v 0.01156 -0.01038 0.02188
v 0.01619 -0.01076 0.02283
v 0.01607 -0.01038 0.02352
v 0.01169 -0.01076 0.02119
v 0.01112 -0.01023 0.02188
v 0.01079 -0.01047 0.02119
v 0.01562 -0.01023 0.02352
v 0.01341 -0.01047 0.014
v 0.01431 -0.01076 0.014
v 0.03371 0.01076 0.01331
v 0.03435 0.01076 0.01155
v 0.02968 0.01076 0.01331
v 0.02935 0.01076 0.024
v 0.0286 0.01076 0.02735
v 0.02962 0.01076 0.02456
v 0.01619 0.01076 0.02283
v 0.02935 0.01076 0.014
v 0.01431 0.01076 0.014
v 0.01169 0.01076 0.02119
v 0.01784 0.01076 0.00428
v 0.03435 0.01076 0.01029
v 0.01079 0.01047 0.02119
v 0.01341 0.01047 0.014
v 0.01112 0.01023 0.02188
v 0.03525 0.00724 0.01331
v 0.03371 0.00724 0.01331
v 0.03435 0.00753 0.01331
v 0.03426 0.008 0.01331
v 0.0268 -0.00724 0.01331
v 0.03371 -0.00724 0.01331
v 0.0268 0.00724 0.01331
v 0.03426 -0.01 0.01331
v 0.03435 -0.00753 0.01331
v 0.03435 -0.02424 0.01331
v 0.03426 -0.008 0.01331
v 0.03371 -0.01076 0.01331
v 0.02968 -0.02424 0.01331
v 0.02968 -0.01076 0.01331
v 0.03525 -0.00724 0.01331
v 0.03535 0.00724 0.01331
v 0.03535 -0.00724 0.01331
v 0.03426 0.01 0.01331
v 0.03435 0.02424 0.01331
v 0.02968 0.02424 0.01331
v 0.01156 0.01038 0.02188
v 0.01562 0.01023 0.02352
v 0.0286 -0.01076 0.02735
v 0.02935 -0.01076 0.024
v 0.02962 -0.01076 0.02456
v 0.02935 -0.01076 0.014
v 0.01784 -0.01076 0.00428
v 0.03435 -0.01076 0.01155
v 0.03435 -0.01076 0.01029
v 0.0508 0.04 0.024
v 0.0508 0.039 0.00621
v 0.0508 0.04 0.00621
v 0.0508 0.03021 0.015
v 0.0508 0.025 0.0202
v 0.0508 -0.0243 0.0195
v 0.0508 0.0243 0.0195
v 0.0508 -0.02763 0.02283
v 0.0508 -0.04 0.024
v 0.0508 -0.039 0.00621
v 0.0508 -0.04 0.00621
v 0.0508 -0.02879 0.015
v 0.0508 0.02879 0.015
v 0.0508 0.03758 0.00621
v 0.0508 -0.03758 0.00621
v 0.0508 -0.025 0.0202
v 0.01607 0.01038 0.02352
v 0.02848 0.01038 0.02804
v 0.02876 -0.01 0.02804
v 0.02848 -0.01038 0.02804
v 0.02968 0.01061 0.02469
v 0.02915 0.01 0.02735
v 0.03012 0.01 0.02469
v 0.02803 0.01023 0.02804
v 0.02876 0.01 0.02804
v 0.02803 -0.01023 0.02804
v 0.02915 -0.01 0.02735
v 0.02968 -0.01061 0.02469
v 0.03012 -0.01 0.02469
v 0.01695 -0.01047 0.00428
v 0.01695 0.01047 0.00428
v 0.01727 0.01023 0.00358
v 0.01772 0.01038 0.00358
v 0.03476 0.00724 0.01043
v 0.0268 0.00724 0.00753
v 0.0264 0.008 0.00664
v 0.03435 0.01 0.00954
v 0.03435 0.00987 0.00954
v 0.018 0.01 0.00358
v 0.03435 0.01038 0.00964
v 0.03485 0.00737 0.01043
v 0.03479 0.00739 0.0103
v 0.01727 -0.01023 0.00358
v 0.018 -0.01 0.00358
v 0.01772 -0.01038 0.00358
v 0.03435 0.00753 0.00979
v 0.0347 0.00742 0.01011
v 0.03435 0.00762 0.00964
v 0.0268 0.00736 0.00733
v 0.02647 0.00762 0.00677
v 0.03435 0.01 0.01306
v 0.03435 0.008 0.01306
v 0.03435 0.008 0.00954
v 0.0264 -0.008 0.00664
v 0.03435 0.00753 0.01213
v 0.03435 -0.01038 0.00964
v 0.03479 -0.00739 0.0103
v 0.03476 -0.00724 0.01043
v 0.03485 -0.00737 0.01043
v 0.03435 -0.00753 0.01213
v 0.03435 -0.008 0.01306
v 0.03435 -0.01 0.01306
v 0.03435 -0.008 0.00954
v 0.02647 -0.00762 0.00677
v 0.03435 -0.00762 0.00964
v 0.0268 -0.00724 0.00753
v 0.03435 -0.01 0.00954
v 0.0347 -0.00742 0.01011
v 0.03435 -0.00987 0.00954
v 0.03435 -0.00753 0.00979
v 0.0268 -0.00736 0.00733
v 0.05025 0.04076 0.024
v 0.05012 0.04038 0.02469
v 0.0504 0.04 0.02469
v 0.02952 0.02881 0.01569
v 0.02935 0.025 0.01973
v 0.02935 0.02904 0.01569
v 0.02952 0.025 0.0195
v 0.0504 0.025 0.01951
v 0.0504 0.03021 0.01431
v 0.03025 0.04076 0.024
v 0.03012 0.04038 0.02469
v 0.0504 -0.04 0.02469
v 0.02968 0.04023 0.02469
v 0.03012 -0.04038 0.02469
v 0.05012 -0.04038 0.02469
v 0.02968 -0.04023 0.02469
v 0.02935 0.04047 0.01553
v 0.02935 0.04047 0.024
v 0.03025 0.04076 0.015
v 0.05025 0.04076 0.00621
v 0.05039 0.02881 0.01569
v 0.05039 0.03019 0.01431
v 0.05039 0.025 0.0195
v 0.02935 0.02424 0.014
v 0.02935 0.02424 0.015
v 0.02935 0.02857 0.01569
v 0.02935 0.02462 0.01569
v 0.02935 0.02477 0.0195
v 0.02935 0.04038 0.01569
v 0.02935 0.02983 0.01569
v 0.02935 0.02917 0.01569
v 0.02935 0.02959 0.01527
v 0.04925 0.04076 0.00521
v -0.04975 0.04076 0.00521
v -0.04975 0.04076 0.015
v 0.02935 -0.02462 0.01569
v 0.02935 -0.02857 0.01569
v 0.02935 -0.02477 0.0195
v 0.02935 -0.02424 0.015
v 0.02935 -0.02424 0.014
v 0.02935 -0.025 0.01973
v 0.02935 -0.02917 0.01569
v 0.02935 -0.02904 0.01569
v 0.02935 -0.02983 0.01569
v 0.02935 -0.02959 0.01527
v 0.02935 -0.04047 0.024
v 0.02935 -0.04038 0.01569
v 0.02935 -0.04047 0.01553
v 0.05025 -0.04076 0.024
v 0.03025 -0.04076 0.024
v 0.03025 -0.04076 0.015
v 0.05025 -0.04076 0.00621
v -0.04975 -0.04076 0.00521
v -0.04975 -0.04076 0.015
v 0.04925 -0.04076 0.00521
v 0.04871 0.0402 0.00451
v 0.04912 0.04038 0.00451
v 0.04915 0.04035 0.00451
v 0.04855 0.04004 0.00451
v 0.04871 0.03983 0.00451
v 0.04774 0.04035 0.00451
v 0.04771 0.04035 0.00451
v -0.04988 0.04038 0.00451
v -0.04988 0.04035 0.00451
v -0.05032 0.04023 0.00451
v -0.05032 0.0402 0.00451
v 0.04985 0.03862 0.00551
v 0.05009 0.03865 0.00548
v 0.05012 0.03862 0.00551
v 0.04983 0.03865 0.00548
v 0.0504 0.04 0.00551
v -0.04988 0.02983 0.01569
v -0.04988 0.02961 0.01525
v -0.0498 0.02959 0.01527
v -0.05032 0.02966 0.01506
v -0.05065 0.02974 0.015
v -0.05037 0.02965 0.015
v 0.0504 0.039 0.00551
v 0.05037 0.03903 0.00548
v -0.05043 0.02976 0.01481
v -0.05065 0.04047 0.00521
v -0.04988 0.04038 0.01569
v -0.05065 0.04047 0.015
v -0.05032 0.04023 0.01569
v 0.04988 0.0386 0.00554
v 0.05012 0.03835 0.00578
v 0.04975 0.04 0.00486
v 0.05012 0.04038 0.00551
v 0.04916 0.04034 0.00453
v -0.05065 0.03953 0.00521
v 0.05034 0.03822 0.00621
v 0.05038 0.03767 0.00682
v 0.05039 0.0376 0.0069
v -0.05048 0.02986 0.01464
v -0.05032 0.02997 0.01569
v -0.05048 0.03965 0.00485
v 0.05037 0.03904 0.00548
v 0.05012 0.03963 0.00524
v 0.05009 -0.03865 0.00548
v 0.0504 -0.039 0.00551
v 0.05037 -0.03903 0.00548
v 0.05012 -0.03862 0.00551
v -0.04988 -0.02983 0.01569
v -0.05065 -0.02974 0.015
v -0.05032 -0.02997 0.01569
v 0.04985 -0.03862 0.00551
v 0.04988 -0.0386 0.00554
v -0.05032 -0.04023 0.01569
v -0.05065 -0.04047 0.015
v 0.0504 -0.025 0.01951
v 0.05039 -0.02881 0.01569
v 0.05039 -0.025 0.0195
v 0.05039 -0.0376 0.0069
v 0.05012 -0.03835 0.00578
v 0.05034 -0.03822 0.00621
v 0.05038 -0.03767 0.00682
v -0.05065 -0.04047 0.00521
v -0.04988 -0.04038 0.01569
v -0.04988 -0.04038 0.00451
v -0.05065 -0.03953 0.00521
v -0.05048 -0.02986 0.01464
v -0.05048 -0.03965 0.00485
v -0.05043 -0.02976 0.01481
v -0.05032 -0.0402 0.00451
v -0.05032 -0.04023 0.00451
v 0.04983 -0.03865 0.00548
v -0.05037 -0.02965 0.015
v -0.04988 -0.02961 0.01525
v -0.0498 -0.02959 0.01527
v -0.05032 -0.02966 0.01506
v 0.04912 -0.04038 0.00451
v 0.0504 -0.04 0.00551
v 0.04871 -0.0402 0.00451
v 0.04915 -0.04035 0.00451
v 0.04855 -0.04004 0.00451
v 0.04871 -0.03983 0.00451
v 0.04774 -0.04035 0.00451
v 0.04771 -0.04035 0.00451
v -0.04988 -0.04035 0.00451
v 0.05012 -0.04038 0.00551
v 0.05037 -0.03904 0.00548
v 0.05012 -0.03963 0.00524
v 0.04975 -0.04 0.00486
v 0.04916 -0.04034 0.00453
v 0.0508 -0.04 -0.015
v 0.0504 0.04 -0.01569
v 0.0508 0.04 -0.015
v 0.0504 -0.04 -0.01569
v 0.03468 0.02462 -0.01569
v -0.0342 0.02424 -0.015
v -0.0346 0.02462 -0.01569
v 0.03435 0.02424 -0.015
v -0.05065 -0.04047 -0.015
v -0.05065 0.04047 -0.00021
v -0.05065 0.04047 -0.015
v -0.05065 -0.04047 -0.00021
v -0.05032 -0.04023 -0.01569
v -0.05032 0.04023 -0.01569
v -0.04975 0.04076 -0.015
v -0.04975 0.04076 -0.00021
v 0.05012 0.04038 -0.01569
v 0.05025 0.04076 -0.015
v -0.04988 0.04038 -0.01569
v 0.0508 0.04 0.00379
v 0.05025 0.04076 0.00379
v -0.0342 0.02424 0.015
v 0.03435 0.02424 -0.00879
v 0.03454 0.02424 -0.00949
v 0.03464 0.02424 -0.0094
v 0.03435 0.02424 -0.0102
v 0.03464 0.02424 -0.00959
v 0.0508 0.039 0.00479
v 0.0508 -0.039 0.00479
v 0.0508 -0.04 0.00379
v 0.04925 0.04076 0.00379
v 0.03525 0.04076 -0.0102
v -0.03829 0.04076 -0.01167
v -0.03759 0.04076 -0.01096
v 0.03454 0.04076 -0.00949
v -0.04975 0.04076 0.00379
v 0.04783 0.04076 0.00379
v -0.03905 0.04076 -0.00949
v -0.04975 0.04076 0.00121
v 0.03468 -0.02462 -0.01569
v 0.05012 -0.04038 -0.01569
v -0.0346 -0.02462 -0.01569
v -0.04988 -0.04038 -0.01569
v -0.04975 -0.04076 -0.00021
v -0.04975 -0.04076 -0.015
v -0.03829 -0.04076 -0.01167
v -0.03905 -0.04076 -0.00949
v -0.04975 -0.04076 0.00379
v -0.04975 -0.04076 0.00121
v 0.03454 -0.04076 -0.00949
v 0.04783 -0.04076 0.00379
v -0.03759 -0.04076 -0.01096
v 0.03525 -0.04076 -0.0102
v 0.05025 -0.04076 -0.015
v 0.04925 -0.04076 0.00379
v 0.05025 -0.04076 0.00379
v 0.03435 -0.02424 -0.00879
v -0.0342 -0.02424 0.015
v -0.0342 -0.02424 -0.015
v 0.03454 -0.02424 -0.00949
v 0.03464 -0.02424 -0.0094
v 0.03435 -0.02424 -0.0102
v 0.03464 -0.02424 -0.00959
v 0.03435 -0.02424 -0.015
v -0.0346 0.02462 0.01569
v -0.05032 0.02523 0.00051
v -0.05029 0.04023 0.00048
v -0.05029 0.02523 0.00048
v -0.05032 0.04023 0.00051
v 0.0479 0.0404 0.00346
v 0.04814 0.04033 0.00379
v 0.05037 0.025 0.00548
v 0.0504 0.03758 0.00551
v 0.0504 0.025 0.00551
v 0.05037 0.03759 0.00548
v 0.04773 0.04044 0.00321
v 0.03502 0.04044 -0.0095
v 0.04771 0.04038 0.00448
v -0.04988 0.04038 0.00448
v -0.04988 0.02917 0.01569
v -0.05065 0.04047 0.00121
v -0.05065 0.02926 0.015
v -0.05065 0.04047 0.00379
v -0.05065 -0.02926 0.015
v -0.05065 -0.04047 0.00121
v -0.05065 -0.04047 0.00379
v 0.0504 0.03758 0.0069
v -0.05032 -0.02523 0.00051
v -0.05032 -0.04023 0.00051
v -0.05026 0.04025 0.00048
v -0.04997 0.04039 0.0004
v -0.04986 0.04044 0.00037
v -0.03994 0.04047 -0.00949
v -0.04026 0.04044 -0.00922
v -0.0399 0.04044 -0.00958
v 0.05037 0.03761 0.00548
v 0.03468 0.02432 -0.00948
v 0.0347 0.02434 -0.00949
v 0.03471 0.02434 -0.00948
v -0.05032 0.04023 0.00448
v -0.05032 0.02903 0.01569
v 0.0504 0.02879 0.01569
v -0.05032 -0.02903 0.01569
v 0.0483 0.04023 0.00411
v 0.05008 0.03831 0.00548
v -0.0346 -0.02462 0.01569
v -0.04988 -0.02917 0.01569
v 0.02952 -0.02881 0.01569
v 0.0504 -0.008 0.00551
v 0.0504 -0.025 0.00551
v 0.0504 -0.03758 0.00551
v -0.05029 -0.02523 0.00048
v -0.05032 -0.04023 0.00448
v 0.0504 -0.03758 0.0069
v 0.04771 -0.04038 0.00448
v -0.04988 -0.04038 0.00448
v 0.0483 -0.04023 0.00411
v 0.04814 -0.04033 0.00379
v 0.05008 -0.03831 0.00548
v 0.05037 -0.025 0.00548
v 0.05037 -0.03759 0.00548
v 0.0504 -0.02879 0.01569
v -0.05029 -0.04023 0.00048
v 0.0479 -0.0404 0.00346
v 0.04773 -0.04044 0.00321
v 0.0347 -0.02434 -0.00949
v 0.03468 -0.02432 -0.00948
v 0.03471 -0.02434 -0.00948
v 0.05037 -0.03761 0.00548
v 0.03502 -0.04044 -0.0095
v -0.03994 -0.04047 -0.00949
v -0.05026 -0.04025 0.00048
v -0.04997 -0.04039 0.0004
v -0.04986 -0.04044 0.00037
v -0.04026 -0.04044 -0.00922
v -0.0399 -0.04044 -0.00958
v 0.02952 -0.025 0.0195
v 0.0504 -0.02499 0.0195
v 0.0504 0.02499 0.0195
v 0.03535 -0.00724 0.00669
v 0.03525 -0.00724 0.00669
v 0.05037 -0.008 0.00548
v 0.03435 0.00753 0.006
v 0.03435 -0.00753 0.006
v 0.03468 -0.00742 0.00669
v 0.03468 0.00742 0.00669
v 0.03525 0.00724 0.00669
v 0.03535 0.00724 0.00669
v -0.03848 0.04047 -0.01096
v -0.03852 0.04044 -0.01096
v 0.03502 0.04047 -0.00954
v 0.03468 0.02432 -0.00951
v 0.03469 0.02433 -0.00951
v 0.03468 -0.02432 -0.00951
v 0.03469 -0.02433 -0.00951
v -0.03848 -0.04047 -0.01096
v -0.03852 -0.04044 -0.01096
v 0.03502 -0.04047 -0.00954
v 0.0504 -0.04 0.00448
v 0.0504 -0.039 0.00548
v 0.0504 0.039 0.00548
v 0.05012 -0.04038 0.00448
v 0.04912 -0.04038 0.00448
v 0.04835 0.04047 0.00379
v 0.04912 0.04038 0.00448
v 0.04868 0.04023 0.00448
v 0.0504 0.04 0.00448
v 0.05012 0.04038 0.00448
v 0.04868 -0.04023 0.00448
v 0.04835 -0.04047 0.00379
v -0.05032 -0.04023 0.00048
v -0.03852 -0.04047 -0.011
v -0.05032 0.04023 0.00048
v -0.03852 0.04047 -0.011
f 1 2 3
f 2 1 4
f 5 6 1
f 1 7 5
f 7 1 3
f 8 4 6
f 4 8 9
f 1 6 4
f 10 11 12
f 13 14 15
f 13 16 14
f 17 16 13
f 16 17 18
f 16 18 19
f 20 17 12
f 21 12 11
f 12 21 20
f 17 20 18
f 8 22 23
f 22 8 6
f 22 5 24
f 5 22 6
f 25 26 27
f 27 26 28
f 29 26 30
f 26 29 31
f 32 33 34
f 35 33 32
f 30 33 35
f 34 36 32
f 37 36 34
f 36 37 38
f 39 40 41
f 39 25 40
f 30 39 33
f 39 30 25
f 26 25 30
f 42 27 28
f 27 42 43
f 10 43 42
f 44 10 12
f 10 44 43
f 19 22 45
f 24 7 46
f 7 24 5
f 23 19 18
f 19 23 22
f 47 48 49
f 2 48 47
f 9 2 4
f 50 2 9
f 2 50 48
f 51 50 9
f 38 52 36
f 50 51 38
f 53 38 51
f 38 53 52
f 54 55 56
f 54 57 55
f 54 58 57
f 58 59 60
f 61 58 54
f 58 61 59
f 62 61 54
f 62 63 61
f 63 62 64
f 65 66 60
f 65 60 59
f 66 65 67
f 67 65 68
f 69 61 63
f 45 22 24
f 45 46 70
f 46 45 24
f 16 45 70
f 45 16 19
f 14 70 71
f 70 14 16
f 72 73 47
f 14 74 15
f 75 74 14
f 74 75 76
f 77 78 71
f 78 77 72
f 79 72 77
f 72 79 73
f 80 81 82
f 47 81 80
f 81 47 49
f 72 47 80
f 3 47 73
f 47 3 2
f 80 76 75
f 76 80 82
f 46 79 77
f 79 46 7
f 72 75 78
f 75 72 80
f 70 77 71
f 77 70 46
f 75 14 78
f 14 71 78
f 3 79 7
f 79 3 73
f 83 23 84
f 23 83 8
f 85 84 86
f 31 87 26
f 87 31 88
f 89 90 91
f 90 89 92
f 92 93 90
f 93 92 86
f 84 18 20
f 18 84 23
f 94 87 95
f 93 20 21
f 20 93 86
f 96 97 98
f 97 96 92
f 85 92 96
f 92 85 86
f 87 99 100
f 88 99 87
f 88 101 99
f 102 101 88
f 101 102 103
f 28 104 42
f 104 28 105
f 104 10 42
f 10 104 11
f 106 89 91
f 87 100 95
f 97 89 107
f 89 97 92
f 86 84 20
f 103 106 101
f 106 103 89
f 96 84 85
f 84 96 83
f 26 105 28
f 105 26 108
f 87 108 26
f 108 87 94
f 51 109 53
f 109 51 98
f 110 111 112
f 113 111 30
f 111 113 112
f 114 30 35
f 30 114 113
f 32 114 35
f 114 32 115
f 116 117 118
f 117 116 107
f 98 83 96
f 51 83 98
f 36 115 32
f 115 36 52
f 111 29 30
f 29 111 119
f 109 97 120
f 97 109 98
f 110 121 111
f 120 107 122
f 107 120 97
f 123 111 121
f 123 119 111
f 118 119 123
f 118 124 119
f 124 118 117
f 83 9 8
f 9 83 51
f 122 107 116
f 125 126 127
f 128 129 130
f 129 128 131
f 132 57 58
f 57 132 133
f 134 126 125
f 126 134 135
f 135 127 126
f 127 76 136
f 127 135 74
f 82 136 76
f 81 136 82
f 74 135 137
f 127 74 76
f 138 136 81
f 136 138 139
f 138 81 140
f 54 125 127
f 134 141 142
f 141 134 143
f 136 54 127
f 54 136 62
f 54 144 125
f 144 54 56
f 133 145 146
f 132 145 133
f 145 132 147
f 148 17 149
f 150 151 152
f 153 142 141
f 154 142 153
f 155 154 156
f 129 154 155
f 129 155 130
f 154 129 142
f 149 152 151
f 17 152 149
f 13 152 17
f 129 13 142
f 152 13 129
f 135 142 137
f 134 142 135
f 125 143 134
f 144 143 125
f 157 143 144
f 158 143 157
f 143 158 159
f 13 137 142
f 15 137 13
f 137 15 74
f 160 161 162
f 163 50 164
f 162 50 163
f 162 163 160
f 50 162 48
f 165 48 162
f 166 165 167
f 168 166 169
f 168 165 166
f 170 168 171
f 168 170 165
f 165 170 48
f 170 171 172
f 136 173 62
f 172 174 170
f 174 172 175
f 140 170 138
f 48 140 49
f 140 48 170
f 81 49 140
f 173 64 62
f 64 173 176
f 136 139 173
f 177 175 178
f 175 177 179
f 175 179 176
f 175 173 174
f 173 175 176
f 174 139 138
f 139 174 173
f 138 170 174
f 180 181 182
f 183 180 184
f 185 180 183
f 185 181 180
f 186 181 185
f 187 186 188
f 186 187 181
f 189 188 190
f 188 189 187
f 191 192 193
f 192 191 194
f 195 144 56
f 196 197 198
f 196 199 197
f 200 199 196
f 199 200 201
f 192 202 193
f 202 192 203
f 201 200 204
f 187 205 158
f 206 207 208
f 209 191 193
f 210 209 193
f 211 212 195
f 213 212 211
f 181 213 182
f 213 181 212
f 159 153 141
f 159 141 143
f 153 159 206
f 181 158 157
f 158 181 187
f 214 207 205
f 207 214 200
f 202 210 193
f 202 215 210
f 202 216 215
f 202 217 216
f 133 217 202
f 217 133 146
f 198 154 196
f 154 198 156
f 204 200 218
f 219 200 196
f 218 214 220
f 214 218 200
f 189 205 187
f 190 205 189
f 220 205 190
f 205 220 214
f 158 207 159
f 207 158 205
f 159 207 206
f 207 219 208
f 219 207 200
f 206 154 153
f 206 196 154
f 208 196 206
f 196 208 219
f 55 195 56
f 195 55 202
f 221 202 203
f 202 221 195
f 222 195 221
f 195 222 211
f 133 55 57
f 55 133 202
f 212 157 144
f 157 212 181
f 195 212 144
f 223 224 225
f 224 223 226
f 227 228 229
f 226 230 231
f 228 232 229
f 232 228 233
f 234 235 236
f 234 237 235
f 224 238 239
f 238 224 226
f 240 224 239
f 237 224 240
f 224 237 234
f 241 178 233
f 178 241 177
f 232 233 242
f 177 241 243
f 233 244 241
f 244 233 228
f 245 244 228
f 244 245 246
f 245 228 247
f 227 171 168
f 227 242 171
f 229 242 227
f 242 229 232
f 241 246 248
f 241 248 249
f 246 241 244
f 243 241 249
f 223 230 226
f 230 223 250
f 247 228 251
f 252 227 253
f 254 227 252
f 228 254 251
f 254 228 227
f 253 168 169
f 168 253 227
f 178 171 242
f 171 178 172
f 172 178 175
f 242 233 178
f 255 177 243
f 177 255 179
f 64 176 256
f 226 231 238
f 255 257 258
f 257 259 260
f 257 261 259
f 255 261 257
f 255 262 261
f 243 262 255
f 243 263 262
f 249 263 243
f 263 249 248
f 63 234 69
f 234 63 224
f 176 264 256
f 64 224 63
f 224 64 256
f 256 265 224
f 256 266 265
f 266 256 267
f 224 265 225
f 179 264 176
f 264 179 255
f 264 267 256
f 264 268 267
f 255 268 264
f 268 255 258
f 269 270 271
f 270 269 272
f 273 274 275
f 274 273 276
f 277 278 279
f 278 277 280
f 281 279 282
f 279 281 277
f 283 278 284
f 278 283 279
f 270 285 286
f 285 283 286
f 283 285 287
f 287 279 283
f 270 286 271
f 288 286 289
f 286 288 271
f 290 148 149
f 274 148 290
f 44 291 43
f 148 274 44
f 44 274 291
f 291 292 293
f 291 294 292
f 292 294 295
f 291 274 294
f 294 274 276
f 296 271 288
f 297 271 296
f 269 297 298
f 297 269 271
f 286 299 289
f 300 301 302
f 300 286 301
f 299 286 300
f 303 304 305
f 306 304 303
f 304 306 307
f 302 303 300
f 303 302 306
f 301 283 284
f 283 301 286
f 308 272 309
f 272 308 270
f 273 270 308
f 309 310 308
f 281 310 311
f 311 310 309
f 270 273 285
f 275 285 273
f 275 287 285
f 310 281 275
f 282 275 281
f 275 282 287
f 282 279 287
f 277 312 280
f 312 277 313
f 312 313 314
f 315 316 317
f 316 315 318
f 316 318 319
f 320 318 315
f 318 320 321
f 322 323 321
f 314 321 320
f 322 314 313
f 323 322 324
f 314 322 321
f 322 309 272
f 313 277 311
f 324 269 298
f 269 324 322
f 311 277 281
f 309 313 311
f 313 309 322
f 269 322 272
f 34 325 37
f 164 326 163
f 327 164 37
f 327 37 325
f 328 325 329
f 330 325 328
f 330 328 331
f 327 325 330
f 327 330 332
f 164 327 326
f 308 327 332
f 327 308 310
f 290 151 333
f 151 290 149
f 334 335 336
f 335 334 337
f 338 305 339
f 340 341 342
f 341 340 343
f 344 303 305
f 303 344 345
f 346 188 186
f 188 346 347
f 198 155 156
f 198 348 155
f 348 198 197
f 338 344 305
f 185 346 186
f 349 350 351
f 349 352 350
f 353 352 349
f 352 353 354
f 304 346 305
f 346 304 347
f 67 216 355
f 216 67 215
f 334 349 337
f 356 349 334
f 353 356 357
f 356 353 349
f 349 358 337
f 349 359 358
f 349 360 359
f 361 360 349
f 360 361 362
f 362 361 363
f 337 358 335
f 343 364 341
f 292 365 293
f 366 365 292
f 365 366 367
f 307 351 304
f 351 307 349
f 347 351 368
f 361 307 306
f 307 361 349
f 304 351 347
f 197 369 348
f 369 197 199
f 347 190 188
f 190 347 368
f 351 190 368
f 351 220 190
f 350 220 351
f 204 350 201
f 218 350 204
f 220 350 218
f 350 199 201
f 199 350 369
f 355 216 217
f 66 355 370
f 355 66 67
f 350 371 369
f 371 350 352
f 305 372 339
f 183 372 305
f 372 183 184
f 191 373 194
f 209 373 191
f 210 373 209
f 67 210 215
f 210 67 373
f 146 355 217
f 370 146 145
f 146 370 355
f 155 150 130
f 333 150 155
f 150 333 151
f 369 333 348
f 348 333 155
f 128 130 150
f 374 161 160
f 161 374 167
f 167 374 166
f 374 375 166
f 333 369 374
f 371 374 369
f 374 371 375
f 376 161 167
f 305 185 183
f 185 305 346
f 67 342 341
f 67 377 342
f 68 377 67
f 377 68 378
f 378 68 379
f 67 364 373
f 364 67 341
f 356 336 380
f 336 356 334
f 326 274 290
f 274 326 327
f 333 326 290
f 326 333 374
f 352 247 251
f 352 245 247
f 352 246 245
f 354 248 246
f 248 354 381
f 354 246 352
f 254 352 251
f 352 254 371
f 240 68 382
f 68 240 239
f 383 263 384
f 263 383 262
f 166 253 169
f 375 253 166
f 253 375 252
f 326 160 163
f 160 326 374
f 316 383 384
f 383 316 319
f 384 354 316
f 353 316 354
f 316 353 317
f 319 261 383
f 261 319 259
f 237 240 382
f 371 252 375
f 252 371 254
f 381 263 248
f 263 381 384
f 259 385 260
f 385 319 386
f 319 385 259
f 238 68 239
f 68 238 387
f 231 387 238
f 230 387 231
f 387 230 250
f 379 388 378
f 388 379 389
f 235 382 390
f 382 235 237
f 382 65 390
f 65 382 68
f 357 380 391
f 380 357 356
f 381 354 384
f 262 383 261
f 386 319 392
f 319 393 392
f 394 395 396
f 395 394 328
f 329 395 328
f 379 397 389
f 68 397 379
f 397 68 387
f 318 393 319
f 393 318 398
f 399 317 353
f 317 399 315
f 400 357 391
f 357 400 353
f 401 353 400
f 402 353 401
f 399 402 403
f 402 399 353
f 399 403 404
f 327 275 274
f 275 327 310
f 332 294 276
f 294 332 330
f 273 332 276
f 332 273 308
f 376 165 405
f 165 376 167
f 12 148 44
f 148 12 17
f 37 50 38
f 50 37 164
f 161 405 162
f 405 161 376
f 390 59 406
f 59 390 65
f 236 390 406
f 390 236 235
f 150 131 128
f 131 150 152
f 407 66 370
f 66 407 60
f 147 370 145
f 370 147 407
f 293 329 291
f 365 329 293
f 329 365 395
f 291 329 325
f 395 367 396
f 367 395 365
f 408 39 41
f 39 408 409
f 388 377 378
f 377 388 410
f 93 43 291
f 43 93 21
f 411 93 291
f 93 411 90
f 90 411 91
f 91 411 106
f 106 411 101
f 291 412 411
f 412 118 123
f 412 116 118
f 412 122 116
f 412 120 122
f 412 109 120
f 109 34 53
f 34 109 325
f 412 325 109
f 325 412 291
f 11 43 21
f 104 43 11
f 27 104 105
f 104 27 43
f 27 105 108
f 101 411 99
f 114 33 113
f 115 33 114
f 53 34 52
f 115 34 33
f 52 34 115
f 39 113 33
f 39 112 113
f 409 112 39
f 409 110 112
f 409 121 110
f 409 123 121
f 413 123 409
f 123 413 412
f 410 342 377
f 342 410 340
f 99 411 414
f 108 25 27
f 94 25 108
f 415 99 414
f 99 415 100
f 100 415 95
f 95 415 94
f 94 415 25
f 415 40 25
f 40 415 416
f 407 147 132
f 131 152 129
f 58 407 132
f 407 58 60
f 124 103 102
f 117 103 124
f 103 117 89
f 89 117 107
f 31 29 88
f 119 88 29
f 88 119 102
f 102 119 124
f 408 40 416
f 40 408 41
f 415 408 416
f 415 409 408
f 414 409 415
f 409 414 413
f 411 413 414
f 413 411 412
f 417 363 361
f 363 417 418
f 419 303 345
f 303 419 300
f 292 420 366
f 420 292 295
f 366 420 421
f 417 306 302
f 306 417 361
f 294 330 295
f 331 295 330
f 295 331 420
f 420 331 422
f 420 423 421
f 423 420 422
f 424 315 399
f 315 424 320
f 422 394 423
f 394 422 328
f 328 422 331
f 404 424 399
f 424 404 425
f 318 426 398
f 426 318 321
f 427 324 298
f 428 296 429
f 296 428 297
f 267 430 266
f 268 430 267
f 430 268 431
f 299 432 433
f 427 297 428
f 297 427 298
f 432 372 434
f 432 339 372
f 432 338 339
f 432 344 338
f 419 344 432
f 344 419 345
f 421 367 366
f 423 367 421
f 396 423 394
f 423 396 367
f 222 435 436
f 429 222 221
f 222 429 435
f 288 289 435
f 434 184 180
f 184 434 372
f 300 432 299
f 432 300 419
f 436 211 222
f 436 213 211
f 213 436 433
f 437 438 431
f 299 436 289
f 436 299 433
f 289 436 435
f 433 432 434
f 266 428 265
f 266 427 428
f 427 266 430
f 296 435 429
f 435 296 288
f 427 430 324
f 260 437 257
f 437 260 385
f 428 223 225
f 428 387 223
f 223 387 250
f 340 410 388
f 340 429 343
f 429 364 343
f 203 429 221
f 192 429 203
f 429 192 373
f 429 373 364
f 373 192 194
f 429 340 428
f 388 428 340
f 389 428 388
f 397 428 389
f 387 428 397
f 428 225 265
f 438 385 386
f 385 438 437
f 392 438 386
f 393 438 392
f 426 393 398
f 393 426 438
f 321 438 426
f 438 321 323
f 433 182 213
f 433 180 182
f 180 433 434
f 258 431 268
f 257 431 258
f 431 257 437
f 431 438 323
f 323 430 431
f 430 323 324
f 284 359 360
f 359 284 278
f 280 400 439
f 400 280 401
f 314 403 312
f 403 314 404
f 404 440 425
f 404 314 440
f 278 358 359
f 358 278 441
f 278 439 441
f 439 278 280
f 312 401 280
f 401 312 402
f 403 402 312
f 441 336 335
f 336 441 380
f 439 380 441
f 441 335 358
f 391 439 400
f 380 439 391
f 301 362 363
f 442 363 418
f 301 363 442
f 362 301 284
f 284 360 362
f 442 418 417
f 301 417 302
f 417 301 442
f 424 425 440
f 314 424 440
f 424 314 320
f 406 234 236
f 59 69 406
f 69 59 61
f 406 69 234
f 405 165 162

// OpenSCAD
// Parameters
L = 0.1; //[0.05:0.2:0.001]
W = 0.08; //[0.04:0.16:0.001]
T = 0.03; //[0.015:0.06:0.001]
frame_wall = 0.012; //[0.006:0.024:0.001]
opening_L = 0.07; //[0.035:0.09:0.001]
opening_W = 0.05; //[0.025:0.07:0.001]
end_block_L = 0.02; //[0.01:0.04:0.001]
end_block_extra_T = 0.01; //[0.005:0.02:0.001]
tab_L = 0.018; //[0.009:0.036:0.001]
tab_W = 0.02; //[0.01:0.04:0.001]
tab_T = 0.018; //[0.009:0.03:0.001]
tab_angle_deg = 20; //[0:45:1]
step_drop = 0.006; //[0.003:0.012:0.001]
gap_H = 0.008; //[0.004:0.016:0.001]
gap_L = 0.01; //[0.005:0.02:0.001]
overlap = 0.001; //[0.0005:0.002:0.0005]
chamfer = 0.001; //[0.0005:0.003:0.0005]
fillet_r = 0.0008; //[0.0004:0.002:0.0002]

// Base Shapes
module outer_frame_plate() {
  cube([L, W, T], center=true);
}

module central_through_opening() {
  cube([opening_L, opening_W, T + 2*overlap], center=true);
}

module end_block_thick_region() {
  translate([L/2 - end_block_L/2, 0, T/2 + end_block_extra_T/2 - overlap])
    cube([end_block_L, W, end_block_extra_T], center=true);
}

module cantilever_hook_tab_raw() {
  translate([opening_L/2 - tab_L/2 + overlap, 0, T/2 - tab_T/2 + overlap])
    cube([tab_L, tab_W, tab_T], center=true);
}

module hook_step_raw() {
  translate([opening_L/2 - (tab_L*0.35)/2 + overlap, 0, T/2 - tab_T/2 - step_drop/2 + overlap])
    cube([tab_L*0.35, tab_W, step_drop], center=true);
}

module undercut_gap_raw() {
  translate([opening_L/2 - gap_L/2 + overlap, 0, T/2 - tab_T/2 + gap_H/2])
    cube([gap_L, tab_W*0.8, gap_H], center=true);
}

module chamfer_wedge_xp() {
  translate([L/2 - chamfer/2, 0, end_block_extra_T/2])
    rotate([0, 45, 0])
    cube([chamfer, W + 2*overlap, T + end_block_extra_T + 2*overlap], center=true);
}

module chamfer_wedge_xn() {
  translate([-L/2 + chamfer/2, 0, 0])
    rotate([0, -45, 0])
    cube([chamfer, W + 2*overlap, T + 2*overlap], center=true);
}

module chamfer_wedge_yp() {
  translate([0, W/2 - chamfer/2, end_block_extra_T/2])
    rotate([45, 0, 0])
    cube([L + 2*overlap, chamfer, T + end_block_extra_T + 2*overlap], center=true);
}

module chamfer_wedge_yn() {
  translate([0, -W/2 + chamfer/2, end_block_extra_T/2])
    rotate([-45, 0, 0])
    cube([L + 2*overlap, chamfer, T + end_block_extra_T + 2*overlap], center=true);
}

module small_fillet_rounding_sphere() {
  sphere(r=fillet_r, center=true);
}

// Operations
module frame_minus_opening() {
  difference() {
    outer_frame_plate();
    central_through_opening();
  }
}

module frame_with_end_block() {
  union() {
    frame_minus_opening();
    end_block_thick_region();
  }
}

module hook_tab_with_step() {
  union() {
    cantilever_hook_tab_raw();
    hook_step_raw();
  }
}

module hook_tab_angled() {
  rotate([0, -tab_angle_deg, 0])
    hook_tab_with_step();
}

module frame_with_hook_tab() {
  union() {
    frame_with_end_block();
    hook_tab_angled();
  }
}

module frame_hook_with_undercut_gap() {
  difference() {
    frame_with_hook_tab();
    undercut_gap_raw();
  }
}

module edge_chamfers() {
  difference() {
    frame_hook_with_undercut_gap();
    chamfer_wedge_xp();
    chamfer_wedge_xn();
    chamfer_wedge_yp();
    chamfer_wedge_yn();
  }
}

module small_fillet_rounding() {
  minkowski() {
    edge_chamfers();
    small_fillet_rounding_sphere();
  }
}

// Final Output
small_fillet_rounding();
